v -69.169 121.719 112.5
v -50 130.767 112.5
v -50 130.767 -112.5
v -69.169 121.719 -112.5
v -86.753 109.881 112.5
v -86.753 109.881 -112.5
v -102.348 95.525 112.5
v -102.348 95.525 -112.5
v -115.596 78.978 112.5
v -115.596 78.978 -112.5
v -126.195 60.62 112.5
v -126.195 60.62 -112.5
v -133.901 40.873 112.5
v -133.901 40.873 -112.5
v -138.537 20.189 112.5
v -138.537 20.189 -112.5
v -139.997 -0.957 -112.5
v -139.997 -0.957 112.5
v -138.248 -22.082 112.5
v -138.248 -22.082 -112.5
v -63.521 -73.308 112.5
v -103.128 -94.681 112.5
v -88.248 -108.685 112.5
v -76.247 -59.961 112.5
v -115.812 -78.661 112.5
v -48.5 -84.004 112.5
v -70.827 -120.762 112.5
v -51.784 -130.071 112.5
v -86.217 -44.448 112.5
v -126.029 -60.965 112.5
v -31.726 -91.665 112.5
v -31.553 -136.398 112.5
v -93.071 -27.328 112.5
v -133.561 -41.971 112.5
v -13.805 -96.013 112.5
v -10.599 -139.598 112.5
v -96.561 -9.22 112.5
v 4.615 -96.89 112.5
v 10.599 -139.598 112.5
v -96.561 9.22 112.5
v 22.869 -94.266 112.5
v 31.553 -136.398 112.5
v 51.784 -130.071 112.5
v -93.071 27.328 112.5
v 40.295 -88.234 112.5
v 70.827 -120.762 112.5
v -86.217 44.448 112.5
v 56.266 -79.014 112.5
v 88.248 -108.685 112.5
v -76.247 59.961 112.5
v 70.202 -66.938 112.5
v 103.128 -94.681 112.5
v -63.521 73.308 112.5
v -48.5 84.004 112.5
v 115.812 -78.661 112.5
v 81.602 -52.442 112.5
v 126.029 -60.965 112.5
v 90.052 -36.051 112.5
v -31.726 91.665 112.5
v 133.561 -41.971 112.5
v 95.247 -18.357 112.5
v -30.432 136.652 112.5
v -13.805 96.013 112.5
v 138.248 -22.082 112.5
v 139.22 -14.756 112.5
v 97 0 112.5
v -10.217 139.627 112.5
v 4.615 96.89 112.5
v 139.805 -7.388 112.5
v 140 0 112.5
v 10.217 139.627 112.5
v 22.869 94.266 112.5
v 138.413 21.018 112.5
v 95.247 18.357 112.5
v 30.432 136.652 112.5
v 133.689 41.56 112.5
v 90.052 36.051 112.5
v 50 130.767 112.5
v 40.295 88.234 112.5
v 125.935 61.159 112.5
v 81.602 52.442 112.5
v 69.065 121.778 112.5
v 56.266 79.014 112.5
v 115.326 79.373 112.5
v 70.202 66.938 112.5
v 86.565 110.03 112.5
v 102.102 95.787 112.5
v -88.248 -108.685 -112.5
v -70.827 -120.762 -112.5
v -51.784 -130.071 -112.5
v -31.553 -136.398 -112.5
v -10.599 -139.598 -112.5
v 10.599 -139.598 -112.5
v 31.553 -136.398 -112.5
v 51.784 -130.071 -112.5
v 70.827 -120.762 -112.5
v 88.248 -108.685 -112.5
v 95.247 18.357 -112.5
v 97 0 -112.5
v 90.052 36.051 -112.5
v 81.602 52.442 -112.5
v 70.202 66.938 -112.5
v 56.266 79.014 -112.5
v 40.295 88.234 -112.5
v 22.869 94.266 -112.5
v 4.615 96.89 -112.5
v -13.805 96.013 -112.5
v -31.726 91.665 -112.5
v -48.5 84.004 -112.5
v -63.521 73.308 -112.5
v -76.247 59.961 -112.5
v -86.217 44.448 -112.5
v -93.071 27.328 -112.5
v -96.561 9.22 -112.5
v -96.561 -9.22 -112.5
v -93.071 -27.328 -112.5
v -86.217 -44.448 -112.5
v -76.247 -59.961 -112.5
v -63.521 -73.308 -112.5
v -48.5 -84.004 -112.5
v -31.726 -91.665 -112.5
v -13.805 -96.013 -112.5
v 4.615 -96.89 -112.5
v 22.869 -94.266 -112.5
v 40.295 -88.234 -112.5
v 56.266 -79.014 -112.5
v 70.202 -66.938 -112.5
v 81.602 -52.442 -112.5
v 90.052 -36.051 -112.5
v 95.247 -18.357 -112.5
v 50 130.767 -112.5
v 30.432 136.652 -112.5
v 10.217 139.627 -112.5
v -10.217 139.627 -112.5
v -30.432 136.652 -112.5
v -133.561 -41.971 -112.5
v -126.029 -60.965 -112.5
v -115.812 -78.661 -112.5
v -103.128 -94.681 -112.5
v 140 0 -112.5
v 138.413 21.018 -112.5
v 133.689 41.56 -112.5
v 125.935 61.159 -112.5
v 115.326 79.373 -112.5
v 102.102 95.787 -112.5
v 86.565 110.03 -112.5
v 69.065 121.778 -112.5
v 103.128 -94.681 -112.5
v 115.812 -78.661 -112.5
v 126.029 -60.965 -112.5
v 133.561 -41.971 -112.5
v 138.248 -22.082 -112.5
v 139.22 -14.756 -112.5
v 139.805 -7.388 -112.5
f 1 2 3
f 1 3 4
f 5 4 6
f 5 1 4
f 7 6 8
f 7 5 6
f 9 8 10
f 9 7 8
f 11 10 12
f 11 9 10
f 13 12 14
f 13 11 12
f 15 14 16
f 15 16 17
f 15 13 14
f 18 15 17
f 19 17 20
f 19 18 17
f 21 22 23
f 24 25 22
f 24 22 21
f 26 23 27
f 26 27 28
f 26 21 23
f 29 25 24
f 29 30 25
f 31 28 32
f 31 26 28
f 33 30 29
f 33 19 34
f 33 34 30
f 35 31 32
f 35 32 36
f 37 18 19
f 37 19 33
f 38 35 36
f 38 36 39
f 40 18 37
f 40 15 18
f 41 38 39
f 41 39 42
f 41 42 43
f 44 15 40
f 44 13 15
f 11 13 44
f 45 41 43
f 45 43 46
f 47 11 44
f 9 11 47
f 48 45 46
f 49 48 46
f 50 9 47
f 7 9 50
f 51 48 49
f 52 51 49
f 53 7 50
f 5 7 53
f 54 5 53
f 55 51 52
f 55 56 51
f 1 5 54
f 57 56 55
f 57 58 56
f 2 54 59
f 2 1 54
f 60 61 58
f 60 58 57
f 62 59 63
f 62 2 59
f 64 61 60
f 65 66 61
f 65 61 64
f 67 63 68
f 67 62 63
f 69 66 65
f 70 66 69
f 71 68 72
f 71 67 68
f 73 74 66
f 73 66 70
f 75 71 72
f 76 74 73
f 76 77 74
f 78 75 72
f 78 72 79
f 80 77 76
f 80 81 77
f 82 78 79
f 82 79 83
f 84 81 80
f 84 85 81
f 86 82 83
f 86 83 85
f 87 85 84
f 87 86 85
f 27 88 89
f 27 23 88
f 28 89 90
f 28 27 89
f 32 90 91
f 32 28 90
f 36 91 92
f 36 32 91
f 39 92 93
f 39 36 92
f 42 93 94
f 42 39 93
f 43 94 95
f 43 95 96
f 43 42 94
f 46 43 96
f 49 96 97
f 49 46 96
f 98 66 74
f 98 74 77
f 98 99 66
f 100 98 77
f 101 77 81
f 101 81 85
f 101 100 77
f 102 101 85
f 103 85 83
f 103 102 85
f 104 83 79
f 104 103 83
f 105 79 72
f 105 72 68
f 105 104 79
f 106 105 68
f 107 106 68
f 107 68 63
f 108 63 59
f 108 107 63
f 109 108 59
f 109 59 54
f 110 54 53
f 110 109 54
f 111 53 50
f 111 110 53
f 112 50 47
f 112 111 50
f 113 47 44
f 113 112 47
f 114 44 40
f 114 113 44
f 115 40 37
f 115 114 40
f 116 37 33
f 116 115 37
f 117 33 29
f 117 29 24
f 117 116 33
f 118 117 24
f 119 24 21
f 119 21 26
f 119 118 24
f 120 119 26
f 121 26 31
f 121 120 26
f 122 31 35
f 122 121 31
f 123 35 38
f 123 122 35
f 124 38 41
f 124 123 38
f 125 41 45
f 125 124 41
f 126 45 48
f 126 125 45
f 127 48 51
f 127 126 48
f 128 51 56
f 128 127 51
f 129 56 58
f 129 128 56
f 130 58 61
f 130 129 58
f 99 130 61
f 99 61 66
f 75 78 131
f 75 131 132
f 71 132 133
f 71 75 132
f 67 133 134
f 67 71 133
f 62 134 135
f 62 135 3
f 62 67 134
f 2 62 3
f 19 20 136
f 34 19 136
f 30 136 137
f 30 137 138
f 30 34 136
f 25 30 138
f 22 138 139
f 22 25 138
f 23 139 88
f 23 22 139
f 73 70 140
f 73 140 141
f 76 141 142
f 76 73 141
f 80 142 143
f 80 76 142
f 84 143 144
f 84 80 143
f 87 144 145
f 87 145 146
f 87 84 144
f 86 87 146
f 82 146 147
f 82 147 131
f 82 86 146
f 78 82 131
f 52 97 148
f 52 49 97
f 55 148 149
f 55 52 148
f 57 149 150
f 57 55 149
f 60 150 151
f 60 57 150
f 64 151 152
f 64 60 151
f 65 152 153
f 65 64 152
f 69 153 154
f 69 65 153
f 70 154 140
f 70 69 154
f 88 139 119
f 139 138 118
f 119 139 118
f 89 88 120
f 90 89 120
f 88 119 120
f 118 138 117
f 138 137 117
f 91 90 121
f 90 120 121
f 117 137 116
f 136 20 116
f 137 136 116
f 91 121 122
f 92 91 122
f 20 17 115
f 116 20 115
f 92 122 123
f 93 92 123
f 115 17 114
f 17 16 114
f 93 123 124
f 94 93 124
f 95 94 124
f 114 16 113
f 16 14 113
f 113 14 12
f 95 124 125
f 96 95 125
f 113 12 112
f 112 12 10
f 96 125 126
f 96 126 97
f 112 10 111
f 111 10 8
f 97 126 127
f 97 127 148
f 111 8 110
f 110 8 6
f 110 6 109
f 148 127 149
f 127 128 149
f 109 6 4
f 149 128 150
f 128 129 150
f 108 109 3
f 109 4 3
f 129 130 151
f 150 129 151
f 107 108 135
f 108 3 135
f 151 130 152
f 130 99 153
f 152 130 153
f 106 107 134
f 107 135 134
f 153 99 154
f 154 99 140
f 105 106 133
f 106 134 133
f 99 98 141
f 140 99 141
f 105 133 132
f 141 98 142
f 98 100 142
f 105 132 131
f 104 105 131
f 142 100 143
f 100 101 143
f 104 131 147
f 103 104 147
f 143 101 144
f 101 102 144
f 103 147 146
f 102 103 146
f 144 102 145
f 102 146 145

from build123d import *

# Parameters (mm, degrees)
F0_R     = 97
F1_DEPTH = 112.5


with BuildPart() as f1:
    # F0 (on Top) → F1 (new body, symmetric)
    with BuildSketch(Plane.XY):
        with BuildLine():
            ThreePointArc((138.247517, -22.082214), (139.561191, -11.075822), (140, 0))
            ThreePointArc((140, 0), (115.325626, 79.372539), (50, 130.766968))
            ThreePointArc((50, 130.766968), (0, 140), (-50, 130.766968))
            ThreePointArc((-50, 130.766968), (-121.243557, 70), (-138.247517, -22.082214))
            ThreePointArc((-138.247517, -22.082214), (-121.243557, -70), (-88.247517, -108.684754))
            ThreePointArc((-88.247517, -108.684754), (0, -140), (88.247517, -108.684754))
            ThreePointArc((88.247517, -108.684754), (121.243557, -70), (138.247517, -22.082214))
        make_face()
        Circle(F0_R, mode=Mode.SUBTRACT)
    extrude(amount=F1_DEPTH, both=True)


solid = f1.part
